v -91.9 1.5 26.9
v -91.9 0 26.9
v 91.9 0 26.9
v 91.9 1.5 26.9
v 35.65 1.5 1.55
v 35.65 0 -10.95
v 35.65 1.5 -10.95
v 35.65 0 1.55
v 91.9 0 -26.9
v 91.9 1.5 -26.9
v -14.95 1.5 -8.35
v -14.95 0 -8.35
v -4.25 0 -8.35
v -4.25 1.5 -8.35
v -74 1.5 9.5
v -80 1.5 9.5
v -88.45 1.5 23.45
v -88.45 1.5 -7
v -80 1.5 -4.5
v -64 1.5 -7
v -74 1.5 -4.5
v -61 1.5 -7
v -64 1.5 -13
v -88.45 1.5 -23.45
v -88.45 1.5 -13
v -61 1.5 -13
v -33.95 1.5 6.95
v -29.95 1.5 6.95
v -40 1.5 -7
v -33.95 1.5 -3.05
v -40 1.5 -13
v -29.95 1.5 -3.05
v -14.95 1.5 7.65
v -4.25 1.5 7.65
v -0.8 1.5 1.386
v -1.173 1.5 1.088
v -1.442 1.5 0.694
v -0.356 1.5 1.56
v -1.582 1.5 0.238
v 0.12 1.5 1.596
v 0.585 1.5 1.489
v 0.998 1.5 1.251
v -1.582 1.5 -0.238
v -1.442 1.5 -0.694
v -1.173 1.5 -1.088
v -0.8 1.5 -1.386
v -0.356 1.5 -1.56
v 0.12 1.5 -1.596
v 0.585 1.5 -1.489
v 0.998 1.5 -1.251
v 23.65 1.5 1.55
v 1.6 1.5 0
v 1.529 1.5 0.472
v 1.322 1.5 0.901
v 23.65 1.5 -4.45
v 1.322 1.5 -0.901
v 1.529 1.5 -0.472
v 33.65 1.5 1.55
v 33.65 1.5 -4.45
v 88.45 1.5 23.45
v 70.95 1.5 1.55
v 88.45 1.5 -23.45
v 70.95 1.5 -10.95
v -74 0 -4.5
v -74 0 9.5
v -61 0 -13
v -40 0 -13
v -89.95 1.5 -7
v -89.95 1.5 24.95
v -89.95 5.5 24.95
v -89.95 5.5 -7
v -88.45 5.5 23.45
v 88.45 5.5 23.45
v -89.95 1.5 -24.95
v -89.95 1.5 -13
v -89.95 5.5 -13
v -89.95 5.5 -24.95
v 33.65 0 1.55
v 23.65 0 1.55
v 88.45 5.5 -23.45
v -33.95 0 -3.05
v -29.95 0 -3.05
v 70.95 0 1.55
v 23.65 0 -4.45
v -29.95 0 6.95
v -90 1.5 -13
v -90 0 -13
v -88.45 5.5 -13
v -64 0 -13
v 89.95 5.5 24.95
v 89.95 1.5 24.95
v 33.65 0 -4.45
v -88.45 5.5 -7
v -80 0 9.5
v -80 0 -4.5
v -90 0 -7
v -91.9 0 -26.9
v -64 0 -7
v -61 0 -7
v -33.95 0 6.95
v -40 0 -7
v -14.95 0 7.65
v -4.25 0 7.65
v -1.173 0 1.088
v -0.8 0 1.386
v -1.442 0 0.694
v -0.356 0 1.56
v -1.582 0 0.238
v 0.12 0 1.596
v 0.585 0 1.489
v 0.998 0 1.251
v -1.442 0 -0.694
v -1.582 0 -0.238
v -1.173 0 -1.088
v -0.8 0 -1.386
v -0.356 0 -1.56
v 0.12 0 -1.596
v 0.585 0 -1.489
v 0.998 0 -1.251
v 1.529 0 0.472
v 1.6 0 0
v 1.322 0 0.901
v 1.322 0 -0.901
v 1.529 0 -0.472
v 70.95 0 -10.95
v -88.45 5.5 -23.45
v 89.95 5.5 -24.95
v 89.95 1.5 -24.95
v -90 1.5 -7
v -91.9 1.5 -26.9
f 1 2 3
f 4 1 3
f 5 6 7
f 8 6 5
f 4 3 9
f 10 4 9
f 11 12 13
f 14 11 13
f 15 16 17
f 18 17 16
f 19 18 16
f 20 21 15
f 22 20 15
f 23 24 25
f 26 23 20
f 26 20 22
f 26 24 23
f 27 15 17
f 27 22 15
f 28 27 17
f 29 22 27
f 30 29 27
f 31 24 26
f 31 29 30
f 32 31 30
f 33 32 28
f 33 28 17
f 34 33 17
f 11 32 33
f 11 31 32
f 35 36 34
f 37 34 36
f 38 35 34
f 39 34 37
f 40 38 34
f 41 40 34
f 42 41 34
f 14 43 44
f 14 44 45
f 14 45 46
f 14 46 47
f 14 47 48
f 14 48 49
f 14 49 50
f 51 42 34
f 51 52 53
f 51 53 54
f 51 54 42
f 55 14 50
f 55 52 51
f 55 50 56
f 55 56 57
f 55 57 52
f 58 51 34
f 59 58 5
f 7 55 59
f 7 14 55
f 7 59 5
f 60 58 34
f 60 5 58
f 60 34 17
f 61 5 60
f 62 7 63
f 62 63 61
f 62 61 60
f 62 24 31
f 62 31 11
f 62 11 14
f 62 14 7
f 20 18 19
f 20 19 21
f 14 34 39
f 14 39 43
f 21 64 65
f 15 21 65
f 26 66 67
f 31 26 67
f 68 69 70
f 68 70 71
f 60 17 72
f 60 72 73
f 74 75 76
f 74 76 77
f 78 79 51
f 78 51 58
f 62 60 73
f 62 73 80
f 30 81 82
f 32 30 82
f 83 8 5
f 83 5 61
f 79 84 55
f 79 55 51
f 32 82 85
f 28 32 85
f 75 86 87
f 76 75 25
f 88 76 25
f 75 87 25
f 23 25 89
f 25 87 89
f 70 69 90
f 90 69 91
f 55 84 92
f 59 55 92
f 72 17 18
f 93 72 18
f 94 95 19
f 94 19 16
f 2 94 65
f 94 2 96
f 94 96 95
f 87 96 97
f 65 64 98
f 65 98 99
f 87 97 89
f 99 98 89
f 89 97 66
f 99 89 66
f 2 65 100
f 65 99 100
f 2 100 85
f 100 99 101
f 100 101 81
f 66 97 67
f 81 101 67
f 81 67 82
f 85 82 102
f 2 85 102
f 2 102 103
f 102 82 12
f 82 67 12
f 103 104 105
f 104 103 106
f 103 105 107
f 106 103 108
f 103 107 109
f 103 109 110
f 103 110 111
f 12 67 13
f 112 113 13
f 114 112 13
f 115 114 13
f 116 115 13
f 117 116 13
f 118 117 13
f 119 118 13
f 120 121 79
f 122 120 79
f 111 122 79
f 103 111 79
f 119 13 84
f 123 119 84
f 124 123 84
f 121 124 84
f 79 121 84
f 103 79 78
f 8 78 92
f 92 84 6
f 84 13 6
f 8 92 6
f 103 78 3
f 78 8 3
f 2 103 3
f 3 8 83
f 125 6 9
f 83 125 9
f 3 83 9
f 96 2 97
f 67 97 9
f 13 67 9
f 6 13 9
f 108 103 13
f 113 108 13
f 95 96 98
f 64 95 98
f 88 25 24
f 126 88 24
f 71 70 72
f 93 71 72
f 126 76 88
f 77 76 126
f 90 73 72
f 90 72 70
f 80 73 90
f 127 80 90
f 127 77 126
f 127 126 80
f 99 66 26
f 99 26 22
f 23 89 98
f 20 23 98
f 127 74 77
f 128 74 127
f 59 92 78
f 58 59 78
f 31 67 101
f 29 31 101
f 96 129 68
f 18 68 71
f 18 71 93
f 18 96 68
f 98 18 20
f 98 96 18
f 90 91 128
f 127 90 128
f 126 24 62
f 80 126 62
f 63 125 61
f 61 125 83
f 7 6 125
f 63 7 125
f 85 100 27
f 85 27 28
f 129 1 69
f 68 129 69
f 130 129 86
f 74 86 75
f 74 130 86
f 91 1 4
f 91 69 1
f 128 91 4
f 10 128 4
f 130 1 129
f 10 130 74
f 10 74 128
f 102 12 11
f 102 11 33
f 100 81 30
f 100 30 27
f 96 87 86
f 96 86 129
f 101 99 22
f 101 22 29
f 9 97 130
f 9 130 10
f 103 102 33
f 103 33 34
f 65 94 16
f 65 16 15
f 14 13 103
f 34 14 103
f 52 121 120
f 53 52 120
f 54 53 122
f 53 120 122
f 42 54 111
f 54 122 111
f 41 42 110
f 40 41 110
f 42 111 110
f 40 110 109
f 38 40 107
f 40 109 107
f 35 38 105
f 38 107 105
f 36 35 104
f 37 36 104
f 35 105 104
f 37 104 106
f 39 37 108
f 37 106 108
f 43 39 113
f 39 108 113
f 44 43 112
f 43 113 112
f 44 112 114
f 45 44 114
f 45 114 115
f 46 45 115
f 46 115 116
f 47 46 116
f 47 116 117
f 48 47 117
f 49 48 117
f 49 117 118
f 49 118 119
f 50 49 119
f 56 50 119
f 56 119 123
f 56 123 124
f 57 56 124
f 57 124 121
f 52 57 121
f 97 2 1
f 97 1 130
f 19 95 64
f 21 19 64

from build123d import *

# Parameters (mm, degrees)
SKETCH_1_W          = 183.8
SKETCH_1_H          = 53.8
EXTRUDE_1_DEPTH     = 1.5
SKETCH_2_W          = 179.9
SKETCH_2_H          = 49.9
SKETCH_2_W_2        = 176.9
SKETCH_2_H_2        = 46.9
EXTRUDE_2_DEPTH     = 4
SKETCH_3_R          = 1.6
SKETCH_3_W          = 26
SKETCH_3_H          = 6
SKETCH_3_W_2        = 21
SKETCH_3_W_3        = 10.7
SKETCH_3_H_2        = 16
SKETCH_3_W_4        = 35.3
SKETCH_3_H_3        = 12.5
SKETCH_3_W_5        = 4
SKETCH_3_H_4        = 10
SKETCH_3_W_6        = 10
SKETCH_3_W_7        = 6
SKETCH_3_H_5        = 14
CUT_EXTRUDE_1_DEPTH = 10


with BuildPart() as part:
    # 草图1 → 凸台-拉伸1 (new body)
    with BuildSketch(Plane(origin=(0, 0, 0), x_dir=(1, 0, 0), z_dir=(0, 1, 0))):
        Rectangle(SKETCH_1_W, SKETCH_1_H)
    extrude(amount=EXTRUDE_1_DEPTH)

    # 草图2 → 凸台-拉伸2 (add)
    with BuildSketch(Plane(origin=(0, 1.5, 0), x_dir=(1, 0, 0), z_dir=(0, 1, 0))):
        Rectangle(SKETCH_2_W, SKETCH_2_H)
        Rectangle(SKETCH_2_W_2, SKETCH_2_H_2, mode=Mode.SUBTRACT)
    extrude(amount=EXTRUDE_2_DEPTH)

    # 草图3 → 切除-拉伸1 (cut)
    with BuildSketch(Plane.XZ):
        Circle(SKETCH_3_R)
        with Locations((-77, -10)):
            Rectangle(SKETCH_3_W, SKETCH_3_H)
        with Locations((-50.5, -10)):
            Rectangle(SKETCH_3_W_2, SKETCH_3_H)
        with Locations((-9.6, -0.35)):
            Rectangle(SKETCH_3_W_3, SKETCH_3_H_2)
        with Locations((53.3, -4.7)):
            Rectangle(SKETCH_3_W_4, SKETCH_3_H_3)
        with Locations((-31.95, 1.95)):
            Rectangle(SKETCH_3_W_5, SKETCH_3_H_4)
        with Locations((28.65, -1.45)):
            Rectangle(SKETCH_3_W_6, SKETCH_3_H)
        with Locations((-77, 2.5)):
            Rectangle(SKETCH_3_W_7, SKETCH_3_H_5)
    extrude(amount=-CUT_EXTRUDE_1_DEPTH, mode=Mode.SUBTRACT)


solid = part.part
